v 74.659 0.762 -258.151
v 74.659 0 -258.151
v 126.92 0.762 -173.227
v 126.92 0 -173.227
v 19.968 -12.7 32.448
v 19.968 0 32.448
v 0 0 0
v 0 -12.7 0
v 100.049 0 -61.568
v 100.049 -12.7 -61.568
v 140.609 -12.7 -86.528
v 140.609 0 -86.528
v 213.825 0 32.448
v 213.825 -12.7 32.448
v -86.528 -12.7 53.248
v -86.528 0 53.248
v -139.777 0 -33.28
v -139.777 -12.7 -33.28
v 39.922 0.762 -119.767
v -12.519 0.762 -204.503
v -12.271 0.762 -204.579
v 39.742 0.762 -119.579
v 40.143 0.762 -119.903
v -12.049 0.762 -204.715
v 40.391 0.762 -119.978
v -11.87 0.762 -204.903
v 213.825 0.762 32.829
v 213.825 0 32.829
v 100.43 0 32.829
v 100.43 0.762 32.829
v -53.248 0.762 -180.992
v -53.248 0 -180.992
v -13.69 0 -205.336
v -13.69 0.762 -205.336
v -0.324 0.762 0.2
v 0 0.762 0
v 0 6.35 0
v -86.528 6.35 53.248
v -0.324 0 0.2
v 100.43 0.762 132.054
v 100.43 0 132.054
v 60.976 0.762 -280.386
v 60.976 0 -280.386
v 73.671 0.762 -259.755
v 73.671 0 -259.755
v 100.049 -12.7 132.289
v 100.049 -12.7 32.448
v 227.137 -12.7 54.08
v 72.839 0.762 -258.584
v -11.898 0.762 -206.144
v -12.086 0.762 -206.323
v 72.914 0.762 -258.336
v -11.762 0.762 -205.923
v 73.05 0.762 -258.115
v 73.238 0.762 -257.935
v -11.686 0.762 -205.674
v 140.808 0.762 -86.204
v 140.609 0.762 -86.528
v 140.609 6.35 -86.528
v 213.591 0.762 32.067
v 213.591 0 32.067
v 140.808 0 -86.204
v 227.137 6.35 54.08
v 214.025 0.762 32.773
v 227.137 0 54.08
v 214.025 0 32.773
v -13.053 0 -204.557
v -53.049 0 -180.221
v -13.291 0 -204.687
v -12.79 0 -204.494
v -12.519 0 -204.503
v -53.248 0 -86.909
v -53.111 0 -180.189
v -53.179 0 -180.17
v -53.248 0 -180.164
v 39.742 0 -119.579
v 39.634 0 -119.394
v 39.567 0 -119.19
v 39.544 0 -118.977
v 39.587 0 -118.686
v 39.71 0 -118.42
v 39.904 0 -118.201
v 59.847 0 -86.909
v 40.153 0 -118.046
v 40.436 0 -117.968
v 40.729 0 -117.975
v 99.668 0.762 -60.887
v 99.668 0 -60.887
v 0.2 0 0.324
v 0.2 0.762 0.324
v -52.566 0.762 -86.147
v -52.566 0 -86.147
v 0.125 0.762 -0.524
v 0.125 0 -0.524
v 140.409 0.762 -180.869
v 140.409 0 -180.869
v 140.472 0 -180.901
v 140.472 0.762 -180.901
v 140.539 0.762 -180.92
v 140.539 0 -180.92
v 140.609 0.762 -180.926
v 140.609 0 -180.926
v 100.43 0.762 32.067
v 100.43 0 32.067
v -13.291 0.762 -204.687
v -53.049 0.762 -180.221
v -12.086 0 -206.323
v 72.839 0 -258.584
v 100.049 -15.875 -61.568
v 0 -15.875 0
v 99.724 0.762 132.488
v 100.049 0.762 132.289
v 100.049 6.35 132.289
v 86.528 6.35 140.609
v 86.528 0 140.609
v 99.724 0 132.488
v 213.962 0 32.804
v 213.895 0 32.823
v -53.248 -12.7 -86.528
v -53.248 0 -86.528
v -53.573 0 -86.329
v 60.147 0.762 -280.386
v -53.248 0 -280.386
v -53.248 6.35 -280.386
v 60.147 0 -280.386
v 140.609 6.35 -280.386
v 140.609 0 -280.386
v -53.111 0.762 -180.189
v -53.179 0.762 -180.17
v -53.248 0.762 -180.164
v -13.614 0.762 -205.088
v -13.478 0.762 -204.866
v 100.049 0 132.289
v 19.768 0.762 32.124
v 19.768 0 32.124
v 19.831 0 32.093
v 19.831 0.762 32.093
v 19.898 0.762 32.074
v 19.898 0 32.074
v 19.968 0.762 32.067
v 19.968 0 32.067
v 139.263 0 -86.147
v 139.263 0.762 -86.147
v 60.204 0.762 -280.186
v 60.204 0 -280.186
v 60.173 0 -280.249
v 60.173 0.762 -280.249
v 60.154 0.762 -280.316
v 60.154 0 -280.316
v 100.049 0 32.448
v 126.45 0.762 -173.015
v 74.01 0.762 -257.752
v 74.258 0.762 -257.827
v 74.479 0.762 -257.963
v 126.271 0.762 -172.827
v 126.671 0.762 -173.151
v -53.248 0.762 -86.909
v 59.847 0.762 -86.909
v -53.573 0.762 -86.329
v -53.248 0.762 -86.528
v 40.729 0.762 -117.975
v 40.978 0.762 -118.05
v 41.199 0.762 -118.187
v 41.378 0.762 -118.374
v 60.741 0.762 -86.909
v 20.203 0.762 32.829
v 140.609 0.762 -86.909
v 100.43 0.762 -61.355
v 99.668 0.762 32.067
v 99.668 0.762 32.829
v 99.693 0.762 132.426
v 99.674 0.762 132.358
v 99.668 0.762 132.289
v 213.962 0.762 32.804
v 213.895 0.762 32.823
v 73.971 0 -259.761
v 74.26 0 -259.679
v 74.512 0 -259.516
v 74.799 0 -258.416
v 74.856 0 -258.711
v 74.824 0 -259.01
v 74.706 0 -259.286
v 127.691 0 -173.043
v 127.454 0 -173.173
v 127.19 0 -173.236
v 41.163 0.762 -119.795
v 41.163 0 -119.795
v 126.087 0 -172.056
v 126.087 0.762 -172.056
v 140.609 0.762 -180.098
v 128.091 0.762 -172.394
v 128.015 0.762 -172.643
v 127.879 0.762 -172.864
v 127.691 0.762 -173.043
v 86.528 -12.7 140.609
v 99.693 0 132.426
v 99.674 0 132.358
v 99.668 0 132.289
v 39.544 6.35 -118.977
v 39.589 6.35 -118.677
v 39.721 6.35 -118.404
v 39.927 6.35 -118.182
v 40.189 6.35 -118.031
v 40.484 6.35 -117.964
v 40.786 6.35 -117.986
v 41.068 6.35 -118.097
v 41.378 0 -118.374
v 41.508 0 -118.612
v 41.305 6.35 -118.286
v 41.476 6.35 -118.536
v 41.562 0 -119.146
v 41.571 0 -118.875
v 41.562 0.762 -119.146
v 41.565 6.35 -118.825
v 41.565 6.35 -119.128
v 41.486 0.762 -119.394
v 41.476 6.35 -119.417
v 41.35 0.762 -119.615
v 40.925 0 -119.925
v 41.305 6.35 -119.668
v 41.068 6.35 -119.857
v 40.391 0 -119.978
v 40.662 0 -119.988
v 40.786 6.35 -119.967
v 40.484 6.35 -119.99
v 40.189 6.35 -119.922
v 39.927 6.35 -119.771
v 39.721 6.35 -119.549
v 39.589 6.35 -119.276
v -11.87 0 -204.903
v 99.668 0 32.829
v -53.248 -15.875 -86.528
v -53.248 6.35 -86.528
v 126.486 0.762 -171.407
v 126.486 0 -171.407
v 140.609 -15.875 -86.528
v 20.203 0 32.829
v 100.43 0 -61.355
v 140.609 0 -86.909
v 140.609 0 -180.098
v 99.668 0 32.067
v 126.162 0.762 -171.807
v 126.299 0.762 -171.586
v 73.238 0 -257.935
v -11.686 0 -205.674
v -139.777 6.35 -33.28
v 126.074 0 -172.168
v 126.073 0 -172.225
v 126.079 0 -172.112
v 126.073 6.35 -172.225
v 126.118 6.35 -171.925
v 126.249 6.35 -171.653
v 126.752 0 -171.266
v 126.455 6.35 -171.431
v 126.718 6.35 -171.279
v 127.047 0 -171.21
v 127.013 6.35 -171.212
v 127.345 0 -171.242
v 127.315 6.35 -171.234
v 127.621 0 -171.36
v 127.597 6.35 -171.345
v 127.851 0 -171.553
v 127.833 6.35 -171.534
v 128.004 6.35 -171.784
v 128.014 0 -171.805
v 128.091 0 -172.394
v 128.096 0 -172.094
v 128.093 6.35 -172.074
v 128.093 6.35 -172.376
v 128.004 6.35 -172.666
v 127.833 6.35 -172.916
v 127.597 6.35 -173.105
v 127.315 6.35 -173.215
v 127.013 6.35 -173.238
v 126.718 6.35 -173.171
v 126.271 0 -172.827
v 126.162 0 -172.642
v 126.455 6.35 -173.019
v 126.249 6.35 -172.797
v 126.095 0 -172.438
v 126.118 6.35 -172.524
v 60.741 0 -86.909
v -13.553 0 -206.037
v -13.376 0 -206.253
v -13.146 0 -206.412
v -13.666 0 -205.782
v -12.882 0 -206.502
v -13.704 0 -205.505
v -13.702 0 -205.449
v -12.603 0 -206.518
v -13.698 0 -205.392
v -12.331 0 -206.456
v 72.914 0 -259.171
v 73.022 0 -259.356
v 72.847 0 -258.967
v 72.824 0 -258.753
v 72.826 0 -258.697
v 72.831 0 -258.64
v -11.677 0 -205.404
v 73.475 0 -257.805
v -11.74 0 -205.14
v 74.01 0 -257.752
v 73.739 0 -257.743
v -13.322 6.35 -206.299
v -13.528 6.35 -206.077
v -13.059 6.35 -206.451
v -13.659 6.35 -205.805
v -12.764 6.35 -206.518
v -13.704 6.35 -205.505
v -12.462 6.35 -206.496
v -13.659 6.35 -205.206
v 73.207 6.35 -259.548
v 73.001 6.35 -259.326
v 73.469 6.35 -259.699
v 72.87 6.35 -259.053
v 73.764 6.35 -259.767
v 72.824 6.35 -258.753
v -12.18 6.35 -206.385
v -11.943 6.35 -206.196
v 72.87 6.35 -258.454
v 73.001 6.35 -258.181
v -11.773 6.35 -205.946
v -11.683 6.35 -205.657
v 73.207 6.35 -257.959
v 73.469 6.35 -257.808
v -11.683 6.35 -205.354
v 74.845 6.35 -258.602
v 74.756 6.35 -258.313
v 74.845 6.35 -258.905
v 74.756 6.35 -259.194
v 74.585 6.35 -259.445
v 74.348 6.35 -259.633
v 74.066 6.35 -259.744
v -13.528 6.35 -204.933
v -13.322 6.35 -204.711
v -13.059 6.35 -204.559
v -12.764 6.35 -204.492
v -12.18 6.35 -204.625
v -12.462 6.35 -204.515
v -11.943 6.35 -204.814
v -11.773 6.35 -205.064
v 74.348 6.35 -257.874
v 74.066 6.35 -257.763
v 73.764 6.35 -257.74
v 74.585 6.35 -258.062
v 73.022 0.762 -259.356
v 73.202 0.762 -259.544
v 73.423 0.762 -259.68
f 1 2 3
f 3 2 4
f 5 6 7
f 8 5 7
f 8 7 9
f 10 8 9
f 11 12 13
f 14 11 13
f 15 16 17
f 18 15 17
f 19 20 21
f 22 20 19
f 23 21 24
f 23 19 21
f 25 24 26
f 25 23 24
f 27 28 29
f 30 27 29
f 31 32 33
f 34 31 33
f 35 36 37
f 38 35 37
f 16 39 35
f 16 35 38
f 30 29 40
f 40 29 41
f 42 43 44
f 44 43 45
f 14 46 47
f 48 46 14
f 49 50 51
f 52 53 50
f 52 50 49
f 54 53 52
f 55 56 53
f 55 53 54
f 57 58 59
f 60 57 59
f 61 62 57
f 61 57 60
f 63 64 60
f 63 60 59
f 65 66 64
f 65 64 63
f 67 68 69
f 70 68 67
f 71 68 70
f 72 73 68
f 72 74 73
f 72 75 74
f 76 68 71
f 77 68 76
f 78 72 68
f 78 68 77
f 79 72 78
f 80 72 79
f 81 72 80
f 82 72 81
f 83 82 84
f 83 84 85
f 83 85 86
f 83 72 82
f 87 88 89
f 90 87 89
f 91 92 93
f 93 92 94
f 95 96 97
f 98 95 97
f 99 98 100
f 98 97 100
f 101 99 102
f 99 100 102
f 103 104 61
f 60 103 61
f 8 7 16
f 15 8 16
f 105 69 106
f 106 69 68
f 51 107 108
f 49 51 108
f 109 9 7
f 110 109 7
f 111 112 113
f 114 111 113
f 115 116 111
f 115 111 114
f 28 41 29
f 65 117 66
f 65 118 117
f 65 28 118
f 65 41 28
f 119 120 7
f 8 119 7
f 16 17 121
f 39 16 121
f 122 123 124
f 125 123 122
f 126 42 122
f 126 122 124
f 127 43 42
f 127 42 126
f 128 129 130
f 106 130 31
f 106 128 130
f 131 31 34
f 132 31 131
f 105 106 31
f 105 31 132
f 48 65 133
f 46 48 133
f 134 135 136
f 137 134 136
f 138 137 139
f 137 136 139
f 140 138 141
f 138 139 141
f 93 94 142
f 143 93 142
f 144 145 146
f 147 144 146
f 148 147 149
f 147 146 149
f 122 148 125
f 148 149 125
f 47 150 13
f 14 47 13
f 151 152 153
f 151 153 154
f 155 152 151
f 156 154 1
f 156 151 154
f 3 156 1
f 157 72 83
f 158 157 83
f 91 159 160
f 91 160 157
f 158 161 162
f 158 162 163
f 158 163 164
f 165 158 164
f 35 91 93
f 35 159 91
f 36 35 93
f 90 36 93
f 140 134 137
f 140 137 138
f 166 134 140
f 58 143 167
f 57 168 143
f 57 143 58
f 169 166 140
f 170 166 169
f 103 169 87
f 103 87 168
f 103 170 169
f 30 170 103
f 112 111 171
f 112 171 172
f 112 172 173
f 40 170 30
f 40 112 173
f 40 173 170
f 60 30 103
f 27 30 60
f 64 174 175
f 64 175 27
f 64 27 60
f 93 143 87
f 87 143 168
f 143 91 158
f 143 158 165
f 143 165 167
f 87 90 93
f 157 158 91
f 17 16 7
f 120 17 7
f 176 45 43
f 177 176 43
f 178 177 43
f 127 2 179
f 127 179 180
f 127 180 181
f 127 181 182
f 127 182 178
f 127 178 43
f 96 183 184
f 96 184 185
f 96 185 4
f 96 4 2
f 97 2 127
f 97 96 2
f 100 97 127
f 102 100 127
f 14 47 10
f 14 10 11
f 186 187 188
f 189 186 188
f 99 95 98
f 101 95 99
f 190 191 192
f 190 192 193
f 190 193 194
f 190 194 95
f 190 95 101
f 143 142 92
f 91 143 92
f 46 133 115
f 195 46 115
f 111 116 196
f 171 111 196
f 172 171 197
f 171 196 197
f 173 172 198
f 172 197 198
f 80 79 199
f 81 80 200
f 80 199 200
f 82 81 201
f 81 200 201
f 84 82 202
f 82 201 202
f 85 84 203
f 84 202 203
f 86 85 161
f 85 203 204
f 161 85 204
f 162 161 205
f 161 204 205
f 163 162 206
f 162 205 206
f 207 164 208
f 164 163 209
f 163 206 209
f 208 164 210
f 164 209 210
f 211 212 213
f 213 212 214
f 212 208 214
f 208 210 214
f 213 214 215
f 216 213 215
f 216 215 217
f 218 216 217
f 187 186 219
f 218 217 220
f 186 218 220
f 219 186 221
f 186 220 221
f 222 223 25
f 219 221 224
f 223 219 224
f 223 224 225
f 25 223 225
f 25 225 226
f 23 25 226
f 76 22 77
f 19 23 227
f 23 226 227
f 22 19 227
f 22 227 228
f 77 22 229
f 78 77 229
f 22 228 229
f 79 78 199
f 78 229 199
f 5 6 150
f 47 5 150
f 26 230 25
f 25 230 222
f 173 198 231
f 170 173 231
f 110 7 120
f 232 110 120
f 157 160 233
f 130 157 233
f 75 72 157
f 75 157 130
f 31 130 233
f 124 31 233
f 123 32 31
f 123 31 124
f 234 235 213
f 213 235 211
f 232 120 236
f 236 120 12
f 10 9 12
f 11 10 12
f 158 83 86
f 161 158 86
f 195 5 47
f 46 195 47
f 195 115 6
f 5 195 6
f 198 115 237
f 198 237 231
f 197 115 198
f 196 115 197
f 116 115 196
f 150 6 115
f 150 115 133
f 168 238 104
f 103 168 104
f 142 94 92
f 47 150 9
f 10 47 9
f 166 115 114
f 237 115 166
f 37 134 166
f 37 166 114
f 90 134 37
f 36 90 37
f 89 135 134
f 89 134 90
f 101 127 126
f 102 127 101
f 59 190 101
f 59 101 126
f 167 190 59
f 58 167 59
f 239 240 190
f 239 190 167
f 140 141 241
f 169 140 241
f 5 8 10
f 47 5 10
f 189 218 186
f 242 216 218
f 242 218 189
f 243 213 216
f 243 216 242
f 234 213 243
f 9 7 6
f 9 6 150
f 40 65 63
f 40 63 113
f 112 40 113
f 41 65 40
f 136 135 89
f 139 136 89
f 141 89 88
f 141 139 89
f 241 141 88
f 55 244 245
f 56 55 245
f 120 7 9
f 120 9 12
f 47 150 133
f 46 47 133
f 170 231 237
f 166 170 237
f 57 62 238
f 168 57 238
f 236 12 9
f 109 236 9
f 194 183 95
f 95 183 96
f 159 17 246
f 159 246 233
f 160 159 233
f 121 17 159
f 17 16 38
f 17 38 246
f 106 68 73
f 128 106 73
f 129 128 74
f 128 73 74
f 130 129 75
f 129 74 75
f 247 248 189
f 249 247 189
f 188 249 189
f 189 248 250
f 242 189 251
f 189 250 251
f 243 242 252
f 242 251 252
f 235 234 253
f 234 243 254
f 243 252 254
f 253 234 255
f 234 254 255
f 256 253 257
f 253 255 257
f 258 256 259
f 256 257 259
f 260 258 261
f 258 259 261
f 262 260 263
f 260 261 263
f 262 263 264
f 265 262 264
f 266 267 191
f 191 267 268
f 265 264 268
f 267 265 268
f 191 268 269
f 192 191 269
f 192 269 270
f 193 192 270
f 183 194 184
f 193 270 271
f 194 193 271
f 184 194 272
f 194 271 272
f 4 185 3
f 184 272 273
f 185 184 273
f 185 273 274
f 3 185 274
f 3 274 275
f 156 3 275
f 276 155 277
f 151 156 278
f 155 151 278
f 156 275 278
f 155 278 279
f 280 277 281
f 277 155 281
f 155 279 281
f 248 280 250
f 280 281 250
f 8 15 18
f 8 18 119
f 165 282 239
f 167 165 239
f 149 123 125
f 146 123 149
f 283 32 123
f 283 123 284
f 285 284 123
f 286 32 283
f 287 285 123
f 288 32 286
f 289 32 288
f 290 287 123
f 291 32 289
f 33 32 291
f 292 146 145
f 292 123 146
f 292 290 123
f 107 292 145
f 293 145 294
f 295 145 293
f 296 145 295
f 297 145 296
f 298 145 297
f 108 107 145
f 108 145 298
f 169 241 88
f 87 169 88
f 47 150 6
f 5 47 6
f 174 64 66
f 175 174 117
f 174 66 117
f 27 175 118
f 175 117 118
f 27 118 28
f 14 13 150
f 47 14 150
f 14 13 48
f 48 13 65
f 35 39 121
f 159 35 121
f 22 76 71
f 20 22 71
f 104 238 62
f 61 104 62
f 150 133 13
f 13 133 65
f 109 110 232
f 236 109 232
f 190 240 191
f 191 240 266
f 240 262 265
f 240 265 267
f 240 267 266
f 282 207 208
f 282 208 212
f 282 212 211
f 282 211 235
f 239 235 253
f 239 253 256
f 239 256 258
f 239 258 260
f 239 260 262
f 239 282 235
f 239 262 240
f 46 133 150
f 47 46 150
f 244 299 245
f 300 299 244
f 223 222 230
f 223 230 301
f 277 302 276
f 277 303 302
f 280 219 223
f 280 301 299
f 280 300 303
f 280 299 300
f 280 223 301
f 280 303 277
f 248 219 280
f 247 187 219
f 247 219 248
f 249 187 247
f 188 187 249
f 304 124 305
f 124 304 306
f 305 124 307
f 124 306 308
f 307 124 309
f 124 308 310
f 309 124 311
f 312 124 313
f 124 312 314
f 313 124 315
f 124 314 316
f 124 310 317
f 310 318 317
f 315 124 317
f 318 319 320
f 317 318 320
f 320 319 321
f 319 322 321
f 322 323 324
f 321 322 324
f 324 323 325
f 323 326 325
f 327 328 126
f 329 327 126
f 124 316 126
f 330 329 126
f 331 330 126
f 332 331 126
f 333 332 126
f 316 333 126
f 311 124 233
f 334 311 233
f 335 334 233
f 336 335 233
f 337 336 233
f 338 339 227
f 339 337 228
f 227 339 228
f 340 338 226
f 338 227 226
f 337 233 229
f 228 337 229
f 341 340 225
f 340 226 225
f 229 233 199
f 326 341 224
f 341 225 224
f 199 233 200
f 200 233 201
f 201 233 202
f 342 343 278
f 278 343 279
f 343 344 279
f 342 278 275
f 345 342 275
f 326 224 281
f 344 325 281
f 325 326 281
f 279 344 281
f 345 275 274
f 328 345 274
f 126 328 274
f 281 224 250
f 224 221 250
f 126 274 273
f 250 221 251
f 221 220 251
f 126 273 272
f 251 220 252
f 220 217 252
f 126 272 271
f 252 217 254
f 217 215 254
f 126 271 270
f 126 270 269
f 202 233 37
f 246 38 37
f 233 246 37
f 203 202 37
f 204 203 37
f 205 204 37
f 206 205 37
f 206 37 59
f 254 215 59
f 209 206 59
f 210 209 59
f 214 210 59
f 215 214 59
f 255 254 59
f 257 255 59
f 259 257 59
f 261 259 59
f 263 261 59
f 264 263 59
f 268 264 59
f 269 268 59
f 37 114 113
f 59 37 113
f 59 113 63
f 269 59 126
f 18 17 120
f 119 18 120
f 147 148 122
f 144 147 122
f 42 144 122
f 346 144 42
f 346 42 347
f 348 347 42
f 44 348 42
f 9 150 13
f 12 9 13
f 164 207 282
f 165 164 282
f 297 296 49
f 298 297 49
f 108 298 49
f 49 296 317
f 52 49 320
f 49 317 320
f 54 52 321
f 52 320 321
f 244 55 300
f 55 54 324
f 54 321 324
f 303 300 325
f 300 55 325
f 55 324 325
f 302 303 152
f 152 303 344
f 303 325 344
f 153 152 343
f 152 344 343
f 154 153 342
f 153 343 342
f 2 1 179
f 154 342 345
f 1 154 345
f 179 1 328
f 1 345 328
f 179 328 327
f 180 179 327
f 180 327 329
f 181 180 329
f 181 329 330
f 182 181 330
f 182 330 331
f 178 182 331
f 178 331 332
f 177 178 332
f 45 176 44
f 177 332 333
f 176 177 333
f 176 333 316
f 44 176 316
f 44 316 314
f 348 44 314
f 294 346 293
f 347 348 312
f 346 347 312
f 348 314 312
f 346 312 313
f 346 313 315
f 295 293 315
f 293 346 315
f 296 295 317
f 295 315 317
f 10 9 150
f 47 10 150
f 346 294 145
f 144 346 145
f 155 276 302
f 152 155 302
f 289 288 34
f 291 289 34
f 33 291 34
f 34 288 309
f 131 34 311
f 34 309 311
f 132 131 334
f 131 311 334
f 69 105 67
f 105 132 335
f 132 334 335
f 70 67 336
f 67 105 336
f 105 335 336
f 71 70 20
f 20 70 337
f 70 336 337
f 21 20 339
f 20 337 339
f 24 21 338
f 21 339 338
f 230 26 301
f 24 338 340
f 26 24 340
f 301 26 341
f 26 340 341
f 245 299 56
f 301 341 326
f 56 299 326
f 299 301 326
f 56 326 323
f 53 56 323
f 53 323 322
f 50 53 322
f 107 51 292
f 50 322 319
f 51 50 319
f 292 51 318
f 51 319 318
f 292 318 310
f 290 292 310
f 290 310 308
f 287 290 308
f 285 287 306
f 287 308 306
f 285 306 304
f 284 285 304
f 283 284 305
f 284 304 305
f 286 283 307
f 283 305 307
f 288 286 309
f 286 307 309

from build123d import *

# Parameters (mm, degrees)
F1_DEPTH = 6.35
F2_DEPTH = 15.875
F3_DEPTH = 12.7
F4_DEPTH = 12.7
F5_DEPTH = 12.7
F6_DEPTH = 12.7
F7_DEPTH = 12.7
F8_W     = 0.762
F8_H     = 0.762
F9_DEPTH = 0.762
F10_D    = 2.032


with BuildPart() as f1:
    # F0 (on Front) → F1 (new body)
    with BuildSketch(Plane.XZ):
        Polygon((100.0485607549, -61.5683450799), (0, 0), (-53.2482984475, -86.5284849772), (60.5283392509, -86.5284849772), (140.6087880879, -86.5284849772), align=None)
        Polygon((19.9681119178, 32.4481818664), (0, 0), (100.0485607549, -61.5683450799), (100.0485607549, 32.4481818664), align=None)
        Polygon((100.0485607549, 32.4481818664), (100.0485607549, -61.5683450799), (140.6087880879, -86.5284849772), (213.8251984532, 32.4481818664), align=None)
        Polygon((-53.2482984475, -86.5284849772), (0, 0), (-86.5284849772, 53.2482984475), align=None)
        Polygon((60.5283392509, -86.5284849772), (-53.2482984475, -86.5284849772), (-53.2482984475, -180.5450119235), (-12.6880711144, -205.5051518208), (40.5602273331, -118.9766668436), align=None)
        Polygon((-12.6880711144, -205.5051518208), (-53.2482984475, -180.5450119235), (-53.2482984475, -280.3855715126), (60.5283392509, -280.3855715126), (73.8404138627, -258.7534502683), align=None)
        Polygon((86.5284849772, 140.6087880879), (19.9681119178, 32.4481818664), (100.0485607549, 32.4481818664), (100.0485607549, 132.2887414555), align=None)
        Polygon((100.0485607549, 132.2887414555), (100.0485607549, 32.4481818664), (213.8251984532, 32.4481818664), (227.1372730651, 54.0803031107), align=None)
        Polygon((-139.7767834247, -33.2801865297), (-53.2482984475, -86.5284849772), (-86.5284849772, 53.2482984475), align=None)
        Polygon((140.6087880879, -86.5284849772), (60.5283392509, -86.5284849772), (40.5602273331, -118.9766668436), (127.0887123102, -172.2249652911), (140.6087880879, -180.5450119235), align=None)
        Polygon((127.0887123102, -172.2249652911), (40.5602273331, -118.9766668436), (-12.6880711144, -205.5051518208), (73.8404138627, -258.7534502683), align=None)
        Polygon((140.6087880879, -280.3855715126), (140.6087880879, -180.5450119235), (127.0887123102, -172.2249652911), (73.8404138627, -258.7534502683), (60.5283392509, -280.3855715126), align=None)
    extrude(amount=-F1_DEPTH)

    # F8 (on face) → F9 (cut)
    with BuildSketch(Plane.XZ):
        with BuildLine():
            ThreePointArc((-0.1996811192, -0.3244818187), (-0.3706391678, -0.0882474209), (-0.3244818187, 0.1996811192))
            Line((-0.3244818187, 0.1996811192), (-53.5727802662, -86.328803858))
            ThreePointArc((-53.5727802662, -86.328803858), (-53.4341512032, -86.1958894974), (-53.2482984475, -86.1474849772))
            Line((-53.2482984475, -86.1474849772), (-52.5664744016, -86.1474849772))
            Line((-52.5664744016, -86.1474849772), (0.1248006995, -0.5241629378))
            Line((0.1248006995, -0.5241629378), (-0.1996811192, -0.3244818187))
        make_face()
        with BuildLine():
            ThreePointArc((0.1996811192, 0.3244818187), (-0.0882474209, 0.3706391678), (-0.3244818187, 0.1996811192))
            ThreePointArc((-0.3244818187, 0.1996811192), (-0.3706391678, -0.0882474209), (-0.1996811192, -0.3244818187))
            Line((-0.1996811192, -0.3244818187), (0.1248006995, -0.5241629378))
            Line((0.1248006995, -0.5241629378), (0.3244818187, -0.1996811192))
            ThreePointArc((0.3244818187, -0.1996811192), (0.3706391678, 0.0882474209), (0.1996811192, 0.3244818187))
        make_face()
        with BuildLine():
            Line((99.6675607549, -60.8865210341), (0.1996811192, 0.3244818187))
            ThreePointArc((0.1996811192, 0.3244818187), (0.3706391678, 0.0882474209), (0.3244818187, -0.1996811192))
            Line((0.3244818187, -0.1996811192), (0.1248006995, -0.5241629378))
            Line((0.1248006995, -0.5241629378), (99.8488795797, -61.8928268641))
            ThreePointArc((99.8488795797, -61.8928268641), (99.715965259, -61.7541978069), (99.6675607549, -61.5683450799))
            Line((99.6675607549, -61.5683450799), (99.6675607549, -60.8865210341))
        make_face()
        with BuildLine():
            ThreePointArc((-53.2482984475, -86.1474849772), (-53.4341512032, -86.1958894974), (-53.5727802662, -86.328803858))
            ThreePointArc((-53.5727802662, -86.328803858), (-53.5808939273, -86.7143377329), (-53.2482984475, -86.9094849772))
            ThreePointArc((-53.2482984475, -86.9094849772), (-53.0624456918, -86.861080457), (-52.9238166288, -86.7281660964))
            Line((-52.9238166288, -86.7281660964), (-52.5664744016, -86.1474849772))
            Line((-52.5664744016, -86.1474849772), (-53.2482984475, -86.1474849772))
        make_face()
        Polygon((99.6675607549, 32.0671818664), (99.6675607549, -60.8865210341), (100.4295607549, -61.355444111), (100.4295607549, 32.0671818664), align=None)
        with BuildLine():
            Line((100.4295607549, -61.355444111), (99.6675607549, -60.8865210341))
            Line((99.6675607549, -60.8865210341), (99.6675607549, -61.5683450799))
            ThreePointArc((99.6675607549, -61.5683450799), (99.715965259, -61.7541978069), (99.8488795797, -61.8928268641))
            ThreePointArc((99.8488795797, -61.8928268641), (100.2344134819, -61.9009405758), (100.4295607549, -61.5683450799))
            Line((100.4295607549, -61.5683450799), (100.4295607549, -61.355444111))
        make_face()
        with BuildLine():
            ThreePointArc((-52.9238166288, -86.7281660964), (-53.0624456918, -86.861080457), (-53.2482984475, -86.9094849772))
            Line((-53.2482984475, -86.9094849772), (59.846515205, -86.9094849772))
            Line((59.846515205, -86.9094849772), (60.2038574322, -86.328803858))
            ThreePointArc((60.2038574322, -86.328803858), (60.3424864952, -86.1958894974), (60.5283392509, -86.1474849772))
            Line((60.5283392509, -86.1474849772), (-52.5664744016, -86.1474849772))
            Line((-52.5664744016, -86.1474849772), (-52.9238166288, -86.7281660964))
        make_face()
        with BuildLine():
            Line((140.8084692071, -86.2040031585), (100.4295607549, -61.355444111))
            Line((100.4295607549, -61.355444111), (100.4295607549, -61.5683450799))
            ThreePointArc((100.4295607549, -61.5683450799), (100.2344134819, -61.9009405758), (99.8488795797, -61.8928268641))
            Line((99.8488795797, -61.8928268641), (139.2626990134, -86.1474849772))
            Line((139.2626990134, -86.1474849772), (140.6087880879, -86.1474849772))
            ThreePointArc((140.6087880879, -86.1474849772), (140.7125508633, -86.1618867142), (140.8084692071, -86.2040031585))
        make_face()
        with BuildLine():
            Line((19.9681119178, 32.0671818664), (99.6675607549, 32.0671818664))
            Line((99.6675607549, 32.0671818664), (99.6675607549, 32.8291818664))
            Line((99.6675607549, 32.8291818664), (19.9681119178, 32.8291818664))
            ThreePointArc((19.9681119178, 32.8291818664), (19.5871119178, 32.4481818664), (19.9681119178, 32.0671818664))
        make_face()
        with Locations((100.0485607549, 32.4481818664)):
            Rectangle(F8_W, F8_H)
        with BuildLine():
            Line((60.2038574322, -86.328803858), (59.846515205, -86.9094849772))
            Line((59.846515205, -86.9094849772), (60.7412402198, -86.9094849772))
            Line((60.7412402198, -86.9094849772), (60.8528210695, -86.7281660964))
            ThreePointArc((60.8528210695, -86.7281660964), (60.8609347307, -86.3426322215), (60.5283392509, -86.1474849772))
            ThreePointArc((60.5283392509, -86.1474849772), (60.3424864952, -86.1958894974), (60.2038574322, -86.328803858))
        make_face()
        with BuildLine():
            Line((60.7412402198, -86.9094849772), (59.846515205, -86.9094849772))
            Line((59.846515205, -86.9094849772), (40.2357454511, -118.7769858272))
            ThreePointArc((40.2357454511, -118.7769858272), (40.4719798534, -118.6060276898), (40.7599084522, -118.652185025))
            Line((40.7599084522, -118.652185025), (41.0843902709, -118.8518661441))
            Line((41.0843902709, -118.8518661441), (60.7412402198, -86.9094849772))
        make_face()
        with BuildLine():
            ThreePointArc((140.6087880879, -86.9094849772), (140.9753863509, -86.6322477525), (140.8084692071, -86.2040031585))
            ThreePointArc((140.8084692071, -86.2040031585), (140.7125508633, -86.1618867142), (140.6087880879, -86.1474849772))
            Line((140.6087880879, -86.1474849772), (139.2626990134, -86.1474849772))
            Line((139.2626990134, -86.1474849772), (140.4091069687, -86.8529667958))
            ThreePointArc((140.4091069687, -86.8529667958), (140.5050253126, -86.8950832402), (140.6087880879, -86.9094849772))
        make_face()
        with BuildLine():
            Line((100.4295607549, 32.8291818664), (100.4295607549, 32.0671818664))
            Line((100.4295607549, 32.0671818664), (213.8251984532, 32.0671818664))
            ThreePointArc((213.8251984532, 32.0671818664), (214.2061984532, 32.4481818664), (213.8251984532, 32.8291818664))
            Line((213.8251984532, 32.8291818664), (100.4295607549, 32.8291818664))
        make_face()
        with BuildLine():
            Line((99.6675607549, 132.2887414555), (99.6675607549, 32.8291818664))
            Line((99.6675607549, 32.8291818664), (100.4295607549, 32.8291818664))
            Line((100.4295607549, 32.8291818664), (100.4295607549, 132.2887414555))
            ThreePointArc((100.4295607549, 132.2887414555), (100.0485607549, 132.6697414555), (99.6675607549, 132.2887414555))
        make_face()
        with BuildLine():
            Line((60.8528210695, -86.7281660964), (60.7412402198, -86.9094849772))
            Line((60.7412402198, -86.9094849772), (140.6087880879, -86.9094849772))
            ThreePointArc((140.6087880879, -86.9094849772), (140.5050253126, -86.8950832402), (140.4091069687, -86.8529667958))
            Line((140.4091069687, -86.8529667958), (139.2626990134, -86.1474849772))
            Line((139.2626990134, -86.1474849772), (60.5283392509, -86.1474849772))
            ThreePointArc((60.5283392509, -86.1474849772), (60.8609347307, -86.3426322215), (60.8528210695, -86.7281660964))
        make_face()
        with BuildLine():
            ThreePointArc((40.3605462139, -119.3011486623), (40.1895881792, -119.0649143232), (40.2357454511, -118.7769858272))
            Line((40.2357454511, -118.7769858272), (-12.8128718139, -204.980988883))
            Line((-12.8128718139, -204.980988883), (-12.1639081766, -205.3803511213))
            Line((-12.1639081766, -205.3803511213), (40.6850280325, -119.5008297815))
            Line((40.6850280325, -119.5008297815), (40.3605462139, -119.3011486623))
        make_face()
        with BuildLine():
            ThreePointArc((40.7599084522, -118.652185025), (40.4719798534, -118.6060276898), (40.2357454511, -118.7769858272))
            ThreePointArc((40.2357454511, -118.7769858272), (40.1895881792, -119.0649143232), (40.3605462139, -119.3011486623))
            Line((40.3605462139, -119.3011486623), (40.6850280325, -119.5008297815))
            Line((40.6850280325, -119.5008297815), (41.0843902709, -118.8518661441))
            Line((41.0843902709, -118.8518661441), (40.7599084522, -118.652185025))
        make_face()
        with BuildLine():
            Line((127.288393621, -171.9004835903), (41.0843902709, -118.8518661441))
            Line((41.0843902709, -118.8518661441), (40.6850280325, -119.5008297815))
            Line((40.6850280325, -119.5008297815), (126.5645493724, -172.3497659906))
            Line((126.5645493724, -172.3497659906), (126.7642304916, -172.0252841719))
            ThreePointArc((126.7642304916, -172.0252841719), (127.0004649987, -171.8543260973), (127.288393621, -171.9004835903))
        make_face()
        with BuildLine():
            Line((-12.1639081766, -205.3803511213), (-12.8128718139, -204.980988883))
            Line((-12.8128718139, -204.980988883), (-13.0125529331, -205.3054707016))
            ThreePointArc((-13.0125529331, -205.3054707016), (-13.0587102847, -205.5933992313), (-12.8877522518, -205.8296336283))
            ThreePointArc((-12.8877522518, -205.8296336283), (-12.5998237039, -205.8757909911), (-12.3635892958, -205.70483294))
            Line((-12.3635892958, -205.70483294), (-12.1639081766, -205.3803511213))
        make_face()
        with BuildLine():
            Line((-13.0125529331, -205.3054707016), (-12.8128718139, -204.980988883))
            Line((-12.8128718139, -204.980988883), (-53.0486173283, -180.2205301049))
            ThreePointArc((-53.0486173283, -180.2205301049), (-53.5727802662, -180.3453308044), (-53.4479795667, -180.8694937422))
            Line((-53.4479795667, -180.8694937422), (-12.8877522518, -205.8296336283))
            ThreePointArc((-12.8877522518, -205.8296336283), (-13.0587102847, -205.5933992313), (-13.0125529331, -205.3054707016))
        make_face()
        with BuildLine():
            ThreePointArc((127.4131941289, -172.4246464103), (127.4593515041, -172.1367179796), (127.288393621, -171.9004835903))
            ThreePointArc((127.288393621, -171.9004835903), (127.0004649987, -171.8543260973), (126.7642304916, -172.0252841719))
            Line((126.7642304916, -172.0252841719), (126.5645493724, -172.3497659906))
            Line((126.5645493724, -172.3497659906), (127.2135130097, -172.749128229))
            Line((127.2135130097, -172.749128229), (127.4131941289, -172.4246464103))
        make_face()
        with BuildLine():
            Line((140.8084692071, -180.2205301049), (127.288393621, -171.9004835903))
            ThreePointArc((127.288393621, -171.9004835903), (127.4593515041, -172.1367179796), (127.4131941289, -172.4246464103))
            Line((127.4131941289, -172.4246464103), (127.2135130097, -172.749128229))
            Line((127.2135130097, -172.749128229), (140.4091069687, -180.8694937422))
            ThreePointArc((140.4091069687, -180.8694937422), (140.9332699066, -180.7446930427), (140.8084692071, -180.2205301049))
        make_face()
        with BuildLine():
            Line((73.7156131633, -258.2292873305), (-12.1639081766, -205.3803511213))
            Line((-12.1639081766, -205.3803511213), (-12.3635892958, -205.70483294))
            ThreePointArc((-12.3635892958, -205.70483294), (-12.5998237039, -205.8757909911), (-12.8877522518, -205.8296336283))
            Line((-12.8877522518, -205.8296336283), (73.3162509249, -258.8782509678))
            Line((73.3162509249, -258.8782509678), (73.7156131633, -258.2292873305))
        make_face()
        with BuildLine():
            Line((127.2135130097, -172.749128229), (126.5645493724, -172.3497659906))
            Line((126.5645493724, -172.3497659906), (73.7156131633, -258.2292873305))
            Line((73.7156131633, -258.2292873305), (74.0400949819, -258.4289684496))
            ThreePointArc((74.0400949819, -258.4289684496), (74.2110530292, -258.6652028416), (74.1648956876, -258.9531313773))
            Line((74.1648956876, -258.9531313773), (127.2135130097, -172.749128229))
        make_face()
        with BuildLine():
            Line((74.0400949819, -258.4289684496), (73.7156131633, -258.2292873305))
            Line((73.7156131633, -258.2292873305), (73.3162509249, -258.8782509678))
            Line((73.3162509249, -258.8782509678), (73.6407327436, -259.077932087))
            ThreePointArc((73.6407327436, -259.077932087), (73.9286612894, -259.1240894347), (74.1648956876, -258.9531313773))
            ThreePointArc((74.1648956876, -258.9531313773), (74.2110530292, -258.6652028416), (74.0400949819, -258.4289684496))
        make_face()
        with BuildLine():
            Line((73.6407327436, -259.077932087), (73.3162509249, -258.8782509678))
            Line((73.3162509249, -258.8782509678), (60.2038574322, -280.1858903934))
            ThreePointArc((60.2038574322, -280.1858903934), (60.3286581317, -280.7100533313), (60.8528210695, -280.5852526318))
            Line((60.8528210695, -280.5852526318), (74.1648956876, -258.9531313773))
            ThreePointArc((74.1648956876, -258.9531313773), (73.9286612894, -259.1240894347), (73.6407327436, -259.077932087))
        make_face()
    extrude(amount=-F9_DEPTH, mode=Mode.SUBTRACT)

    # F10 (through all)
    with Locations(Plane.XZ):
        with Locations((40.5602273331, -118.9766668436), (127.0887123102, -172.2249652911), (73.8404138627, -258.7534502683), (-12.6880711144, -205.5051518208)):
            Hole(F10_D / 2)


with BuildPart() as f2:
    # F0 (on Front) → F2 (new body)
    with BuildSketch(Plane.XZ):
        Polygon((100.0485607549, -61.5683450799), (0, 0), (-53.2482984475, -86.5284849772), (60.5283392509, -86.5284849772), (140.6087880879, -86.5284849772), align=None)
    extrude(amount=F2_DEPTH)


with BuildPart() as f3:
    # F0 (on Front) → F3 (new body)
    with BuildSketch(Plane.XZ):
        Polygon((100.0485607549, 132.2887414555), (100.0485607549, 32.4481818664), (213.8251984532, 32.4481818664), (227.1372730651, 54.0803031107), align=None)
    extrude(amount=F3_DEPTH)


with BuildPart() as f4:
    # F0 (on Front) → F4 (new body)
    with BuildSketch(Plane.XZ):
        Polygon((86.5284849772, 140.6087880879), (19.9681119178, 32.4481818664), (100.0485607549, 32.4481818664), (100.0485607549, 132.2887414555), align=None)
    extrude(amount=F4_DEPTH)


with BuildPart() as f5:
    # F0 (on Front) → F5 (new body)
    with BuildSketch(Plane.XZ):
        Polygon((100.0485607549, 32.4481818664), (100.0485607549, -61.5683450799), (140.6087880879, -86.5284849772), (213.8251984532, 32.4481818664), align=None)
    extrude(amount=F5_DEPTH)


with BuildPart() as f6:
    # F0 (on Front) → F6 (new body)
    with BuildSketch(Plane.XZ):
        Polygon((19.9681119178, 32.4481818664), (0, 0), (100.0485607549, -61.5683450799), (100.0485607549, 32.4481818664), align=None)
    extrude(amount=F6_DEPTH)


with BuildPart() as f7:
    # F0 (on Front) → F7 (new body)
    with BuildSketch(Plane.XZ):
        Polygon((-53.2482984475, -86.5284849772), (0, 0), (-86.5284849772, 53.2482984475), align=None)
        Polygon((-139.7767834247, -33.2801865297), (-53.2482984475, -86.5284849772), (-86.5284849772, 53.2482984475), align=None)
    extrude(amount=F7_DEPTH)


solid = Compound([f1.part, f2.part, f3.part, f4.part, f5.part, f6.part, f7.part])
